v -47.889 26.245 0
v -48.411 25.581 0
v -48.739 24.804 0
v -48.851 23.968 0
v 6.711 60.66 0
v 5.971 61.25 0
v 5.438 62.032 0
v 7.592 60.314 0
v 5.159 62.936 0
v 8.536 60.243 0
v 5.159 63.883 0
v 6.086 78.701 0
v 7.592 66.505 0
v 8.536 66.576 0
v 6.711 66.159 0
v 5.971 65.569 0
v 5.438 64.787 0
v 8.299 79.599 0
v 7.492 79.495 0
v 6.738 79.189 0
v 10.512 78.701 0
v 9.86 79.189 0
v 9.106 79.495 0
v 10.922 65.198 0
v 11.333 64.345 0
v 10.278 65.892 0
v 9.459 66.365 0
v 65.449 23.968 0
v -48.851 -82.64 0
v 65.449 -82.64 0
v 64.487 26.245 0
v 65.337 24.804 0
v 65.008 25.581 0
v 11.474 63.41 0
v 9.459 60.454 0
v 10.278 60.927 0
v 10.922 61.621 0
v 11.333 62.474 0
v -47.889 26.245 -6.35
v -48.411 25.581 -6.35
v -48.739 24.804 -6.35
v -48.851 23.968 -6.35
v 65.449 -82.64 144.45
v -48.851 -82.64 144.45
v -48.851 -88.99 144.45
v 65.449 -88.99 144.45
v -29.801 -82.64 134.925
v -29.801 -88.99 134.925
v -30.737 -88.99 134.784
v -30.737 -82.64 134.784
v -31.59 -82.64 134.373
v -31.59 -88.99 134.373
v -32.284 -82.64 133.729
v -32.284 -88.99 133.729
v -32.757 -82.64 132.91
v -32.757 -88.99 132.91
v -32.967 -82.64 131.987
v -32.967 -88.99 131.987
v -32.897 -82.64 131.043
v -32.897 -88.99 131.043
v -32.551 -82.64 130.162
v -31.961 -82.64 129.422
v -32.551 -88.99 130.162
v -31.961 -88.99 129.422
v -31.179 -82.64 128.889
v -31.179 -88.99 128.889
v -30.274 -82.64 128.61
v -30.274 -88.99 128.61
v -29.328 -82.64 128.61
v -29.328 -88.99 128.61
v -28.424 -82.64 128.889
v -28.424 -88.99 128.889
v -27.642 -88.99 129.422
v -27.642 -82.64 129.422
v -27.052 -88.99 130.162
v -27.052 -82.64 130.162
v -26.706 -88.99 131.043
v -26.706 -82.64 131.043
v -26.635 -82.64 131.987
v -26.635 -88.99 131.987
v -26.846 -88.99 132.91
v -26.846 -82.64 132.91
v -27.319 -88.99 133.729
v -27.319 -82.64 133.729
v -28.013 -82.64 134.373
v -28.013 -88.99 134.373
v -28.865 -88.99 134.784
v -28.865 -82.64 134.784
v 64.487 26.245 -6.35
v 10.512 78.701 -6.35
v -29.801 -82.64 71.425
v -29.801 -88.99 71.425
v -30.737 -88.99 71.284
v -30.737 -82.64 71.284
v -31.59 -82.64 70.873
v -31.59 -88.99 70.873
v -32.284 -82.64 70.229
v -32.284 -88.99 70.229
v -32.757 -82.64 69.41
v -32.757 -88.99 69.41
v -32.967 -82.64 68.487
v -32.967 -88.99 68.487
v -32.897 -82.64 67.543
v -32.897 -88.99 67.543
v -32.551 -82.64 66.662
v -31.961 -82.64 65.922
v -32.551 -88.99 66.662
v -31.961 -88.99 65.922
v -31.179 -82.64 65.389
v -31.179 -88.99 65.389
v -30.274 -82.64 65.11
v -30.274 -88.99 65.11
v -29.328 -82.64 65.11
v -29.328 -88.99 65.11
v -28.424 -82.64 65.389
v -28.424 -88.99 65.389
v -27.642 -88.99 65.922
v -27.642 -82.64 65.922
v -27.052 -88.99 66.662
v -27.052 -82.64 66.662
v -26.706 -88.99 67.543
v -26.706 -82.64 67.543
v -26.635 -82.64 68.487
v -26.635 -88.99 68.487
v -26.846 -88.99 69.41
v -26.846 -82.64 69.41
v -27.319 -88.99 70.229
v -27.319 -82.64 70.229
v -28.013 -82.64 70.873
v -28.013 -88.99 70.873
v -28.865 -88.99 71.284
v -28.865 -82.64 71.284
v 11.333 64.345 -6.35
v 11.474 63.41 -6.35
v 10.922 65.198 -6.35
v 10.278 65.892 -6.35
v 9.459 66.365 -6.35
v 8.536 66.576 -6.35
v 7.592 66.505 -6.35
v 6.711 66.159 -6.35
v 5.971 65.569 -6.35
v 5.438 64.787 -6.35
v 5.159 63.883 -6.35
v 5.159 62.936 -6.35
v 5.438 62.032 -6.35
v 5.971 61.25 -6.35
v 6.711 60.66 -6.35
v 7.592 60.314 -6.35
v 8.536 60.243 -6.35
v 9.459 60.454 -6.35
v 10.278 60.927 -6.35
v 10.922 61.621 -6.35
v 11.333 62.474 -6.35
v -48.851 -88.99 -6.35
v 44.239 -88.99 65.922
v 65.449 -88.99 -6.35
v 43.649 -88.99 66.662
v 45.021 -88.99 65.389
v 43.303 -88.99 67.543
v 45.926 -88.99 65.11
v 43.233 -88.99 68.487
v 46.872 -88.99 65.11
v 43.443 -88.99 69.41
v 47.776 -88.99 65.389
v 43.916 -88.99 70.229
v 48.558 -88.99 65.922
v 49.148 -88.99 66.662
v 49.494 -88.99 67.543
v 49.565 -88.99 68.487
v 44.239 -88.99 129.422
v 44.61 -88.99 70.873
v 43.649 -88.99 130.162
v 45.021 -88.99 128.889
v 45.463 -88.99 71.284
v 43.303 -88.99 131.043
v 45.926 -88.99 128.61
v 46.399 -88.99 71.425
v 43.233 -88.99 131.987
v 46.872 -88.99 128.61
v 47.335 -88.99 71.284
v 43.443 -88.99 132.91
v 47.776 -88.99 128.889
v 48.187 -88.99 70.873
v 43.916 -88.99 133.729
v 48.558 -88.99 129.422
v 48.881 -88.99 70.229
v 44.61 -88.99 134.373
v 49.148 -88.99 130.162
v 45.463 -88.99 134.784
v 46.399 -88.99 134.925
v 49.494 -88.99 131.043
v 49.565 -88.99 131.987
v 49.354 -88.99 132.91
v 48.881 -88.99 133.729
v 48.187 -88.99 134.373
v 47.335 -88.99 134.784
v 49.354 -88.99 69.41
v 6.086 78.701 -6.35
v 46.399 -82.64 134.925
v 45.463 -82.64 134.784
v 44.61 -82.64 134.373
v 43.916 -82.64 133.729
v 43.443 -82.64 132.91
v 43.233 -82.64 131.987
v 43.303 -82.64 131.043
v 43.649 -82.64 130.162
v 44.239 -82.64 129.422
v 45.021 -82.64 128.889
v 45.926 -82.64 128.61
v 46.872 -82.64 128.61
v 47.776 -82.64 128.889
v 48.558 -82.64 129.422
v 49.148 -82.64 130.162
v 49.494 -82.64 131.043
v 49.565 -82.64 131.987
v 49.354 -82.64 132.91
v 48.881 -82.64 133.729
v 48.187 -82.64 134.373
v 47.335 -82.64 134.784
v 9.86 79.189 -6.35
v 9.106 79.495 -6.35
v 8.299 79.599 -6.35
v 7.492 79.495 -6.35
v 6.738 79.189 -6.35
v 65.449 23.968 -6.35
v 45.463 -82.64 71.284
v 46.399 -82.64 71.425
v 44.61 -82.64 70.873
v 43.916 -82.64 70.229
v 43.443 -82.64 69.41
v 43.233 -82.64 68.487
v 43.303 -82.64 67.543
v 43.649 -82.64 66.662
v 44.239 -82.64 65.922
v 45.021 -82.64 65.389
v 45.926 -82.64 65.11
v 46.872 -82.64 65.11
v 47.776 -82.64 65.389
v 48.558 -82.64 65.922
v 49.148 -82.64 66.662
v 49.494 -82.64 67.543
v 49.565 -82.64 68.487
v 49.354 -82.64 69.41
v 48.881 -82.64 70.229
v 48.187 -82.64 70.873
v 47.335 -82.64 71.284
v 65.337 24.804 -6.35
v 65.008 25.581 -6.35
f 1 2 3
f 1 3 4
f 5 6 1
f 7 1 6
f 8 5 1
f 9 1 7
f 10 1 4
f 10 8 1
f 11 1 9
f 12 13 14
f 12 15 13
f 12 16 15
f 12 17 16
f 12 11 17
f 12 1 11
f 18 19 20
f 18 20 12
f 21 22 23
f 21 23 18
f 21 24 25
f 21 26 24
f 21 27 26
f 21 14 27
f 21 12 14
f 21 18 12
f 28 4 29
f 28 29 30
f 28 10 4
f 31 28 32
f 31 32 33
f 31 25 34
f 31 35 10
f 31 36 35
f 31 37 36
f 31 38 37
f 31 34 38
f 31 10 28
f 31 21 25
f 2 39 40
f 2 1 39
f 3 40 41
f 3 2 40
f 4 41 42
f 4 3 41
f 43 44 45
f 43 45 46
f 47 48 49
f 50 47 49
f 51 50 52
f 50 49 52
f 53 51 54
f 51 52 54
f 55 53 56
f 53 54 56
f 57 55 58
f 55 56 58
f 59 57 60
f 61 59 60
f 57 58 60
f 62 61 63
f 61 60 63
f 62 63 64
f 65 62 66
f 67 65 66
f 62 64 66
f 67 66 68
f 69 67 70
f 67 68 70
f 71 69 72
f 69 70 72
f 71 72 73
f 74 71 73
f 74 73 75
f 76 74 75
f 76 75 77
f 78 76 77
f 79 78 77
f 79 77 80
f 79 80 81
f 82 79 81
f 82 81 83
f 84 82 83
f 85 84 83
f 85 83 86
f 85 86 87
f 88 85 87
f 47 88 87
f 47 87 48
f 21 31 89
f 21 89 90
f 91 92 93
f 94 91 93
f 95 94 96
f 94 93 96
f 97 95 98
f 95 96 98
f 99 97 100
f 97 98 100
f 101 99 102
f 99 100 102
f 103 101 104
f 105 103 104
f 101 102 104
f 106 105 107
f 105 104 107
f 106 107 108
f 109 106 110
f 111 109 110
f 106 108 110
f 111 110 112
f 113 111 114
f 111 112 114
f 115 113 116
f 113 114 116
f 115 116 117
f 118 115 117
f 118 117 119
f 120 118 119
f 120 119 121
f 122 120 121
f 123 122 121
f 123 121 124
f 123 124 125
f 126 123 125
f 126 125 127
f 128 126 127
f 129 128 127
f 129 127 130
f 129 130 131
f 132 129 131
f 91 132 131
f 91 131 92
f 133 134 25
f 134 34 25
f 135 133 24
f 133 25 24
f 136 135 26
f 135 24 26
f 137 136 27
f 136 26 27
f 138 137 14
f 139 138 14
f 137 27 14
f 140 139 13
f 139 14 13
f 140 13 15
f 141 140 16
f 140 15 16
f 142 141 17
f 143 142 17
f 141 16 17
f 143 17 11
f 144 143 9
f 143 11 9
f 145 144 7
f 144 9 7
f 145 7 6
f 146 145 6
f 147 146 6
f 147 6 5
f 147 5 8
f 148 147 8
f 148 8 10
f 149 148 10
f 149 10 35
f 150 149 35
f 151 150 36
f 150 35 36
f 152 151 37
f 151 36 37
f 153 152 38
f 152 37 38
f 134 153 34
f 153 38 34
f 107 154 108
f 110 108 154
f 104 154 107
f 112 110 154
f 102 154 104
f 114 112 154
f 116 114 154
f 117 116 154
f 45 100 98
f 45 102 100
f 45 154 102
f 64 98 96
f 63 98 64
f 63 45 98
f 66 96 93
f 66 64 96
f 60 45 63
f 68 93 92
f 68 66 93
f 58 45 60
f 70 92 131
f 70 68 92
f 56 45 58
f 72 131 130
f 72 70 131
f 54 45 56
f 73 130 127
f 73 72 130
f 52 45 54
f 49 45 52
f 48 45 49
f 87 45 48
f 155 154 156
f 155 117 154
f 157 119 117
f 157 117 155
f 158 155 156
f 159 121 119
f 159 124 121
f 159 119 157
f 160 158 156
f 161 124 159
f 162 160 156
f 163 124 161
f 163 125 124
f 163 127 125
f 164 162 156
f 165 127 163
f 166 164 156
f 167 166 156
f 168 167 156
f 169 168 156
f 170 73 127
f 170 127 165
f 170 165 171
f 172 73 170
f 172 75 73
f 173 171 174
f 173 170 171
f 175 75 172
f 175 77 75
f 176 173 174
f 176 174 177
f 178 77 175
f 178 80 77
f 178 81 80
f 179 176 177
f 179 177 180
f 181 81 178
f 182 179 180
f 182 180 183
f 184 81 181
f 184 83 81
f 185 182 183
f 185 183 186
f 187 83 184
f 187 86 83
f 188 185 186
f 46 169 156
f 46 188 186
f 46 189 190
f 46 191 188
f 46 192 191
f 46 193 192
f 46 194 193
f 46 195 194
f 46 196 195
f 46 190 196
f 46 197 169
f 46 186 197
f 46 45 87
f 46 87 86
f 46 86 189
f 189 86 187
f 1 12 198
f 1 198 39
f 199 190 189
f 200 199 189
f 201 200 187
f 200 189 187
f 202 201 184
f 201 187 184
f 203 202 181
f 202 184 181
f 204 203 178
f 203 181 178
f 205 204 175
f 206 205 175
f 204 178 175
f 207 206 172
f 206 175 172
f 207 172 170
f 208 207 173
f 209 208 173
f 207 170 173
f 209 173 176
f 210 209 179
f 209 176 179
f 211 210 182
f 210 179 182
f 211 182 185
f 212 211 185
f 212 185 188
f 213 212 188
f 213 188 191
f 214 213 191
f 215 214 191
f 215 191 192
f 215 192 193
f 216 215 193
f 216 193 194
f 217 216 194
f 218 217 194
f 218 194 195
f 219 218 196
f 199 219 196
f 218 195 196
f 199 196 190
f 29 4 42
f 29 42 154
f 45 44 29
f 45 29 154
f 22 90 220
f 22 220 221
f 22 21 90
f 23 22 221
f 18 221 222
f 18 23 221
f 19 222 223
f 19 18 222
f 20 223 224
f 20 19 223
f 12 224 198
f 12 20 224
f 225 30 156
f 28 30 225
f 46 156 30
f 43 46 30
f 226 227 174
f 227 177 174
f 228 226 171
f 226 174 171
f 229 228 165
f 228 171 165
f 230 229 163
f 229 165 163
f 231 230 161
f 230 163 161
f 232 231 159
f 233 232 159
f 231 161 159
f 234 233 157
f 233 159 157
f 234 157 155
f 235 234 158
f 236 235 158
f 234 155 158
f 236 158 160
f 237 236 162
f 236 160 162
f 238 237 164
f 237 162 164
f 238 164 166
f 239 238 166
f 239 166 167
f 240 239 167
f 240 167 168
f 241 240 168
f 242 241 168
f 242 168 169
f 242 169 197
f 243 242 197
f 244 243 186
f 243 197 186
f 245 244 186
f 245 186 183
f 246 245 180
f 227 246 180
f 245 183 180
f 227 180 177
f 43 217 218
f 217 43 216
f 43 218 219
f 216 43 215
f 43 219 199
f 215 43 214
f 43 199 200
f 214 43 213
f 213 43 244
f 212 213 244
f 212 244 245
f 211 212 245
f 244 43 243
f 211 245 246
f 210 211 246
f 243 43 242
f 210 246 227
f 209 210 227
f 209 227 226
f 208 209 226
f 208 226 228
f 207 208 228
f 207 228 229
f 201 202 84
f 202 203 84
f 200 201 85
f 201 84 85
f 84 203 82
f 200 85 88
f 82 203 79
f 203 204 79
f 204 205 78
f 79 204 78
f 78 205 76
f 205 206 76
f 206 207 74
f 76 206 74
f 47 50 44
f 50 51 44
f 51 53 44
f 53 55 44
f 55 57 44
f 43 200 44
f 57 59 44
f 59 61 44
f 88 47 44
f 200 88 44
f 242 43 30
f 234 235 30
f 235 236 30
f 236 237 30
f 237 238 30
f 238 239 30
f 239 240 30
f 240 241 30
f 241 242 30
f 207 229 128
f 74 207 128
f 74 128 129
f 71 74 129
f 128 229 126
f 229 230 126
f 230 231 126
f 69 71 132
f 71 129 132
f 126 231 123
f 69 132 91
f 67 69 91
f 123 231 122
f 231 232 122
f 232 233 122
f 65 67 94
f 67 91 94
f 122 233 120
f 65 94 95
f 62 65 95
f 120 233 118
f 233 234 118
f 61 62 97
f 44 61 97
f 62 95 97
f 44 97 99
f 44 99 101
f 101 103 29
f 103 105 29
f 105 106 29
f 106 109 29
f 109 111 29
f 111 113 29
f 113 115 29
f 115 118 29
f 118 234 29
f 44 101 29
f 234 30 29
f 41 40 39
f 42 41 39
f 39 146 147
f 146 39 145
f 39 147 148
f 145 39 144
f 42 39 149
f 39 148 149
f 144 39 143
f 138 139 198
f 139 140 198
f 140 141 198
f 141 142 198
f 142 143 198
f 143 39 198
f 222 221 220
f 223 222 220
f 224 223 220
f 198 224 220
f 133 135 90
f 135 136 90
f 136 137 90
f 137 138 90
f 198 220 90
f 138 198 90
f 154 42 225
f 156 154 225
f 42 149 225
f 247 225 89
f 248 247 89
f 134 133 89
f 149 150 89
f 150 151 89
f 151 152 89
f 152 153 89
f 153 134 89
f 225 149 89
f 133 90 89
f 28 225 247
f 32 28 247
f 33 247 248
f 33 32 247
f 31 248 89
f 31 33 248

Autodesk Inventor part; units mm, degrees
ref_plane "YZ Plane" through (0, 0, 0) normal (1, 0, 0) x (0, 1, 0)
ref_plane "XZ Plane" through (0, 0, 0) normal (0, 1, 0) x (-1, 0, 0)
ref_plane "XY Plane" through (0, 0, 0) normal (0, 0, 1) x (1, 0, 0)
sketch "Sketch1" plane through (0, 0, 0) normal (0, 0, 1) x (1, 0, 0)
  line L0 (-48.8512, -88.9904) -> (65.4488, -88.9904)
  line L1 (65.4488, -88.9904) -> (65.4488, 23.9678)
  line L2 (64.4867, 26.2447) -> (10.5117, 78.7012)
  line L3 (6.086, 78.7012) -> (-47.889, 26.2447)
  line L4 (-48.8512, 23.9678) -> (-48.8512, -88.9904)
  circle A0 centre (8.2988, 63.4096) radius 3.175
  arc A1 (10.5117, 78.7012) -> (6.086, 78.7012) centre (8.2988, 76.4243) ccw
  arc A2 (-47.889, 26.2447) -> (-48.8512, 23.9678) centre (-45.6762, 23.9678) ccw
  arc A3 (65.4488, 23.9678) -> (64.4867, 26.2447) centre (62.2738, 23.9678) ccw
  point P0 (0, 0)
  point P1 (65.4488, 25.3096)
  point P2 (8.2988, 80.8517)
  point P3 (-48.8512, 25.3096)
  dimension "d0" = 114.3
  dimension "d1" = 114.3
  dimension "d2" = 114.3
  dimension "d3" = 57.15
  dimension "d4" = 6.35
  dimension "d5" = 152.4
  dimension "d6" = 3.175
  dimension "d29" = 57.15
extrude "Extrusion1" add sketch "Sketch1" against normal blind 6.35
sketch "Sketch2" plane through (0, 0, 0) normal (0, 0, 1) x (1, 0, 0)
  line L0 (65.4488, -88.9904) -> (-48.8512, -88.9904) projected
  line L1 (-48.8512, -88.9904) -> (65.4488, -88.9904)
  line L2 (65.4488, -88.9904) -> (65.4488, -82.6404)
  line L3 (65.4488, -82.6404) -> (-48.8512, -82.6404)
  line L4 (-48.8512, -82.6404) -> (-48.8512, -88.9904)
  point P0 (0, 0)
  dimension "d9" = 6.35
  dimension "d30" = 114.3
extrude "Extrusion2" add sketch "Sketch2" along normal blind 144.4498
hole "Hole1" at (-29.8012, -82.6404, 131.7498) direction (0, -1, 0) diameter 6.35 end through all
pattern_linear "Rectangular Pattern1" count 2 spacing 63.5 along (0, 0, -1) count 2 spacing 76.2 along (1, 0, 0) of "Hole1"
properties part number "Braquet Rammasse-Balle"
